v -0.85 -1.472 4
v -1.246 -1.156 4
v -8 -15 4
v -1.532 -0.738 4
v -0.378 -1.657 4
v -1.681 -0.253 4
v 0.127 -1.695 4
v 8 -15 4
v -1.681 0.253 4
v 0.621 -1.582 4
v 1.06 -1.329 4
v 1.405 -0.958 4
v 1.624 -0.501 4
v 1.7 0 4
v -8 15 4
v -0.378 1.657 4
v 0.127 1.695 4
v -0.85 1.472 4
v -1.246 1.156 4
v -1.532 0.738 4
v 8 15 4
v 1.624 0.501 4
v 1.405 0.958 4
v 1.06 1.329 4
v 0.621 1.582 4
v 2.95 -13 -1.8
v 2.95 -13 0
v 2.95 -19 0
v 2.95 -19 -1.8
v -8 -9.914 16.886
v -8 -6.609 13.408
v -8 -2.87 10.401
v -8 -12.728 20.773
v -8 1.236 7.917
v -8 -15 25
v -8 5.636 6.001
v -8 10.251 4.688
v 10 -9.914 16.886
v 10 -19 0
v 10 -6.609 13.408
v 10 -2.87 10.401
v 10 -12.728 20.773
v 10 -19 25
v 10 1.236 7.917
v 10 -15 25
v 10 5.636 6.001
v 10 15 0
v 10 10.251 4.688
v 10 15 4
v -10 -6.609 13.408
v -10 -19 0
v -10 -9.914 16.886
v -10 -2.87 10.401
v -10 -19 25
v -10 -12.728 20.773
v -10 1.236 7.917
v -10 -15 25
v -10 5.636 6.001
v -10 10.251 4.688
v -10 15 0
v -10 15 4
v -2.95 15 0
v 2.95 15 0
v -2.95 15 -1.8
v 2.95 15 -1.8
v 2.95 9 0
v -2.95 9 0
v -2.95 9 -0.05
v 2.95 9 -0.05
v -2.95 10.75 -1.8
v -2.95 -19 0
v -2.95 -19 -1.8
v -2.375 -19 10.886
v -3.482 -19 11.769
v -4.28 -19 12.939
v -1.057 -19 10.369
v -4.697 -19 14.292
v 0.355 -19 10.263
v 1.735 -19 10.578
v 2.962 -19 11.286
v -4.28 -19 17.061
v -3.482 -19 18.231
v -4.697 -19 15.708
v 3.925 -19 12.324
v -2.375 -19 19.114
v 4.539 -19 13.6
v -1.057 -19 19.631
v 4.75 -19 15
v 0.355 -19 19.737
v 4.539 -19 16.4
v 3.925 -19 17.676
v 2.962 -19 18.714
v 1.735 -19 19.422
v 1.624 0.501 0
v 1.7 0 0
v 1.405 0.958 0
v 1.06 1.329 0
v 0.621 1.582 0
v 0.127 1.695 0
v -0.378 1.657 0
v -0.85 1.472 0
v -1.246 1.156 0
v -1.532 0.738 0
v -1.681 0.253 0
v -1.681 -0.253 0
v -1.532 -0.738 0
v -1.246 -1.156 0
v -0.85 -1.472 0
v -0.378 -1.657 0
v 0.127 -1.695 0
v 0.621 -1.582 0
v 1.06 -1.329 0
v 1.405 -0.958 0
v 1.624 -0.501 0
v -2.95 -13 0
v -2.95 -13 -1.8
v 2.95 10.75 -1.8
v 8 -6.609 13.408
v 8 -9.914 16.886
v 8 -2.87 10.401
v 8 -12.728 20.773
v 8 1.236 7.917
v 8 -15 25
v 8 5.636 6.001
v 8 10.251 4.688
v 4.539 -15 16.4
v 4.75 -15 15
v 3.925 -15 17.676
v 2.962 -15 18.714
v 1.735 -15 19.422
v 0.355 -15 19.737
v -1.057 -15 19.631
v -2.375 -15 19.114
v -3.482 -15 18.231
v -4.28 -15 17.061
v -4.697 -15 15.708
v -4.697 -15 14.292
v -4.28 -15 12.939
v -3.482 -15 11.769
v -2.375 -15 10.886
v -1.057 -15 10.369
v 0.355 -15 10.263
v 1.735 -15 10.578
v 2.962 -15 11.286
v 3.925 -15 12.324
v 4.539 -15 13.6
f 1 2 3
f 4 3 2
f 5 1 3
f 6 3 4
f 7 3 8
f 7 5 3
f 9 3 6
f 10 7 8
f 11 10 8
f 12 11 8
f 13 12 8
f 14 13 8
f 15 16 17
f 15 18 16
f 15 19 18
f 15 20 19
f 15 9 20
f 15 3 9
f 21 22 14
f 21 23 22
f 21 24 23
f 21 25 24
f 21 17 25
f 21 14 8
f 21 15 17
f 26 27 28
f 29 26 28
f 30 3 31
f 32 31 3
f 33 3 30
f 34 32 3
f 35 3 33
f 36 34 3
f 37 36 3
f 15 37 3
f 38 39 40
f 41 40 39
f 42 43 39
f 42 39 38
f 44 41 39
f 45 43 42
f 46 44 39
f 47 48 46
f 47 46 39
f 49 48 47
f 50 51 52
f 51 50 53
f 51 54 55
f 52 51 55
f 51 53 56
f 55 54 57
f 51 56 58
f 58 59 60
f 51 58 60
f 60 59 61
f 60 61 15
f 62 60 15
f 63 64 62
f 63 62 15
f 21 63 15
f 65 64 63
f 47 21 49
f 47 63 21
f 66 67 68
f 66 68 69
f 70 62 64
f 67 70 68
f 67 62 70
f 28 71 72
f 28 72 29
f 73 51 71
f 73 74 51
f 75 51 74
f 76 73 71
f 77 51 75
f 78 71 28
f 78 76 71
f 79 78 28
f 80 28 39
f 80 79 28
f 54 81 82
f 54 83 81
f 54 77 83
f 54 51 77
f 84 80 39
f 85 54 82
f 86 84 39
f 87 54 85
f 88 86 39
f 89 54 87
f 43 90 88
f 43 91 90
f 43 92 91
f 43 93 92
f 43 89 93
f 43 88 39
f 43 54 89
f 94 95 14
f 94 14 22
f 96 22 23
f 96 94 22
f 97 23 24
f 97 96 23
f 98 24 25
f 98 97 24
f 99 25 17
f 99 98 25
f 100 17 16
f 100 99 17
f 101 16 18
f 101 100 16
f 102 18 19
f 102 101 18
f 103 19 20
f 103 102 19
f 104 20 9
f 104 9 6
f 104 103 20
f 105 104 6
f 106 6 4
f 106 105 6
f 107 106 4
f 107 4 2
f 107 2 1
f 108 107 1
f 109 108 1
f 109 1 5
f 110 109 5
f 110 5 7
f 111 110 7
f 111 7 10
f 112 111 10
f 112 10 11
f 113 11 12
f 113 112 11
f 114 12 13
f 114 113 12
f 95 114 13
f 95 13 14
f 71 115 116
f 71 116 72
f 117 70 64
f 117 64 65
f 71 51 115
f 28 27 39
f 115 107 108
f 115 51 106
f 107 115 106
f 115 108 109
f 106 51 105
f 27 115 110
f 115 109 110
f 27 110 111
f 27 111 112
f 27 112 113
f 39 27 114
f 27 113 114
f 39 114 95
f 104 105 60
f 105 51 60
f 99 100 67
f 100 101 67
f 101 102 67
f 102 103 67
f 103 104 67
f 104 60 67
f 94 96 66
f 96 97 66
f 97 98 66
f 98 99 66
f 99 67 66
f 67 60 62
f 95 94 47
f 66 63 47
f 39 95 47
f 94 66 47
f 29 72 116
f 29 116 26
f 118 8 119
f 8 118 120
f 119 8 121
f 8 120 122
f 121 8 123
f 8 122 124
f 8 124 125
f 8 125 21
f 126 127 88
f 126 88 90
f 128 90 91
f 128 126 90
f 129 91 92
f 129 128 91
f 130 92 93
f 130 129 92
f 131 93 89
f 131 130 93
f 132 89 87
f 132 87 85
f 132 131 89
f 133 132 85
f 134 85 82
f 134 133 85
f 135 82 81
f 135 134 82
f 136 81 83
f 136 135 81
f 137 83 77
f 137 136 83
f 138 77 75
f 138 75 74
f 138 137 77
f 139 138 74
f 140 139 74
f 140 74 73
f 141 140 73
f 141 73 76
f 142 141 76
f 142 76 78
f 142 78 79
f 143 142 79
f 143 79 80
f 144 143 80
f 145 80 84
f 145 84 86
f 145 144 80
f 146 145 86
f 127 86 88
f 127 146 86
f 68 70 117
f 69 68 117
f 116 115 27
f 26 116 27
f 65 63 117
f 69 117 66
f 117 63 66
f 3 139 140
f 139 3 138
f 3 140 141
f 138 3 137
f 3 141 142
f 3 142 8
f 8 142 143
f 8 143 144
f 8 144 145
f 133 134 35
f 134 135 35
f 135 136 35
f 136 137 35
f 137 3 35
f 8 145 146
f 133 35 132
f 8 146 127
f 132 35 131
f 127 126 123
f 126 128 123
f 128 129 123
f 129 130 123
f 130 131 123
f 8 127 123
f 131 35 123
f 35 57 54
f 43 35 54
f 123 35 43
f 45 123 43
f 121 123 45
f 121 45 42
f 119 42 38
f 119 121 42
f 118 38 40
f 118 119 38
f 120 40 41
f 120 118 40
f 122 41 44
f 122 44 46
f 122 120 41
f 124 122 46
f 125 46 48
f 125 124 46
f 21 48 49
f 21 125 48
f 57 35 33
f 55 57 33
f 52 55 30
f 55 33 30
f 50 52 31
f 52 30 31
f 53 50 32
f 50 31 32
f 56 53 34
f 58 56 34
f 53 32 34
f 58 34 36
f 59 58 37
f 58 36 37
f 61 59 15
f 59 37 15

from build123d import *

# Parameters (mm, degrees)
SKETCH090_W     = 20
SKETCH090_H     = 30
SKETCH090_R     = 1.7
PAD021_DEPTH    = 4
SKETCH091_W     = 20
SKETCH091_H     = 25
SKETCH091_R     = 4.75
PAD022_DEPTH    = 4
PAD023_DEPTH    = 2
PAD024_DEPTH    = 2
SKETCH094_W     = 5.9
SKETCH094_H     = 6
PAD025_DEPTH    = 1.8
CHAMFER051_SIZE = 1.75


with BuildPart() as part:
    # Sketch090 → Pad021 (new body)
    with BuildSketch(Plane.XY):
        Rectangle(SKETCH090_W, SKETCH090_H)
        Circle(SKETCH090_R, mode=Mode.SUBTRACT)
    extrude(amount=PAD021_DEPTH)

    # Sketch091 → Pad022 (join)
    with BuildSketch(Plane.XZ.offset(15)):
        with Locations((0, 12.5)):
            Rectangle(SKETCH091_W, SKETCH091_H)
        with Locations((0, 15)):
            Circle(SKETCH091_R, mode=Mode.SUBTRACT)
    extrude(amount=PAD022_DEPTH)

    # Sketch092 → Pad023 (join)
    with BuildSketch(Plane.YZ.offset(8)):
        with BuildLine():
            Line((-15, 25), (-15, 4))
            Line((-15, 4), (15, 4))
            ThreePointArc((-15, 25), (-2.8696242204, 10.400536828), (15, 4))
        make_face()
    extrude(amount=PAD023_DEPTH)

    # Sketch093 → Pad024 (join)
    with BuildSketch(Plane.YZ.offset(-8)):
        with BuildLine():
            Line((-15, 25), (-15, 4))
            Line((-15, 4), (15, 4))
            ThreePointArc((-15, 25), (-2.8696242204, 10.400536828), (15, 4))
        make_face()
    extrude(amount=-PAD024_DEPTH)

    # Sketch094 (on Face4 of Pad024) → Pad025 (join)
    with BuildSketch(Plane(origin=(0, 0, 0), x_dir=(1, 0, 0), z_dir=(0, 0, -1))):
        with Locations((0, 16)):
            Rectangle(SKETCH094_W, SKETCH094_H)
        with Locations((0, -12)):
            Rectangle(SKETCH094_W, SKETCH094_H)
    extrude(amount=PAD025_DEPTH)

    # Chamfer051
    chamfer051_edges = [part.edges().sort_by_distance(p)[0] for p in [
        (0, 9, -1.8),
    ]]
    chamfer(chamfer051_edges, length=CHAMFER051_SIZE)


solid = part.part
